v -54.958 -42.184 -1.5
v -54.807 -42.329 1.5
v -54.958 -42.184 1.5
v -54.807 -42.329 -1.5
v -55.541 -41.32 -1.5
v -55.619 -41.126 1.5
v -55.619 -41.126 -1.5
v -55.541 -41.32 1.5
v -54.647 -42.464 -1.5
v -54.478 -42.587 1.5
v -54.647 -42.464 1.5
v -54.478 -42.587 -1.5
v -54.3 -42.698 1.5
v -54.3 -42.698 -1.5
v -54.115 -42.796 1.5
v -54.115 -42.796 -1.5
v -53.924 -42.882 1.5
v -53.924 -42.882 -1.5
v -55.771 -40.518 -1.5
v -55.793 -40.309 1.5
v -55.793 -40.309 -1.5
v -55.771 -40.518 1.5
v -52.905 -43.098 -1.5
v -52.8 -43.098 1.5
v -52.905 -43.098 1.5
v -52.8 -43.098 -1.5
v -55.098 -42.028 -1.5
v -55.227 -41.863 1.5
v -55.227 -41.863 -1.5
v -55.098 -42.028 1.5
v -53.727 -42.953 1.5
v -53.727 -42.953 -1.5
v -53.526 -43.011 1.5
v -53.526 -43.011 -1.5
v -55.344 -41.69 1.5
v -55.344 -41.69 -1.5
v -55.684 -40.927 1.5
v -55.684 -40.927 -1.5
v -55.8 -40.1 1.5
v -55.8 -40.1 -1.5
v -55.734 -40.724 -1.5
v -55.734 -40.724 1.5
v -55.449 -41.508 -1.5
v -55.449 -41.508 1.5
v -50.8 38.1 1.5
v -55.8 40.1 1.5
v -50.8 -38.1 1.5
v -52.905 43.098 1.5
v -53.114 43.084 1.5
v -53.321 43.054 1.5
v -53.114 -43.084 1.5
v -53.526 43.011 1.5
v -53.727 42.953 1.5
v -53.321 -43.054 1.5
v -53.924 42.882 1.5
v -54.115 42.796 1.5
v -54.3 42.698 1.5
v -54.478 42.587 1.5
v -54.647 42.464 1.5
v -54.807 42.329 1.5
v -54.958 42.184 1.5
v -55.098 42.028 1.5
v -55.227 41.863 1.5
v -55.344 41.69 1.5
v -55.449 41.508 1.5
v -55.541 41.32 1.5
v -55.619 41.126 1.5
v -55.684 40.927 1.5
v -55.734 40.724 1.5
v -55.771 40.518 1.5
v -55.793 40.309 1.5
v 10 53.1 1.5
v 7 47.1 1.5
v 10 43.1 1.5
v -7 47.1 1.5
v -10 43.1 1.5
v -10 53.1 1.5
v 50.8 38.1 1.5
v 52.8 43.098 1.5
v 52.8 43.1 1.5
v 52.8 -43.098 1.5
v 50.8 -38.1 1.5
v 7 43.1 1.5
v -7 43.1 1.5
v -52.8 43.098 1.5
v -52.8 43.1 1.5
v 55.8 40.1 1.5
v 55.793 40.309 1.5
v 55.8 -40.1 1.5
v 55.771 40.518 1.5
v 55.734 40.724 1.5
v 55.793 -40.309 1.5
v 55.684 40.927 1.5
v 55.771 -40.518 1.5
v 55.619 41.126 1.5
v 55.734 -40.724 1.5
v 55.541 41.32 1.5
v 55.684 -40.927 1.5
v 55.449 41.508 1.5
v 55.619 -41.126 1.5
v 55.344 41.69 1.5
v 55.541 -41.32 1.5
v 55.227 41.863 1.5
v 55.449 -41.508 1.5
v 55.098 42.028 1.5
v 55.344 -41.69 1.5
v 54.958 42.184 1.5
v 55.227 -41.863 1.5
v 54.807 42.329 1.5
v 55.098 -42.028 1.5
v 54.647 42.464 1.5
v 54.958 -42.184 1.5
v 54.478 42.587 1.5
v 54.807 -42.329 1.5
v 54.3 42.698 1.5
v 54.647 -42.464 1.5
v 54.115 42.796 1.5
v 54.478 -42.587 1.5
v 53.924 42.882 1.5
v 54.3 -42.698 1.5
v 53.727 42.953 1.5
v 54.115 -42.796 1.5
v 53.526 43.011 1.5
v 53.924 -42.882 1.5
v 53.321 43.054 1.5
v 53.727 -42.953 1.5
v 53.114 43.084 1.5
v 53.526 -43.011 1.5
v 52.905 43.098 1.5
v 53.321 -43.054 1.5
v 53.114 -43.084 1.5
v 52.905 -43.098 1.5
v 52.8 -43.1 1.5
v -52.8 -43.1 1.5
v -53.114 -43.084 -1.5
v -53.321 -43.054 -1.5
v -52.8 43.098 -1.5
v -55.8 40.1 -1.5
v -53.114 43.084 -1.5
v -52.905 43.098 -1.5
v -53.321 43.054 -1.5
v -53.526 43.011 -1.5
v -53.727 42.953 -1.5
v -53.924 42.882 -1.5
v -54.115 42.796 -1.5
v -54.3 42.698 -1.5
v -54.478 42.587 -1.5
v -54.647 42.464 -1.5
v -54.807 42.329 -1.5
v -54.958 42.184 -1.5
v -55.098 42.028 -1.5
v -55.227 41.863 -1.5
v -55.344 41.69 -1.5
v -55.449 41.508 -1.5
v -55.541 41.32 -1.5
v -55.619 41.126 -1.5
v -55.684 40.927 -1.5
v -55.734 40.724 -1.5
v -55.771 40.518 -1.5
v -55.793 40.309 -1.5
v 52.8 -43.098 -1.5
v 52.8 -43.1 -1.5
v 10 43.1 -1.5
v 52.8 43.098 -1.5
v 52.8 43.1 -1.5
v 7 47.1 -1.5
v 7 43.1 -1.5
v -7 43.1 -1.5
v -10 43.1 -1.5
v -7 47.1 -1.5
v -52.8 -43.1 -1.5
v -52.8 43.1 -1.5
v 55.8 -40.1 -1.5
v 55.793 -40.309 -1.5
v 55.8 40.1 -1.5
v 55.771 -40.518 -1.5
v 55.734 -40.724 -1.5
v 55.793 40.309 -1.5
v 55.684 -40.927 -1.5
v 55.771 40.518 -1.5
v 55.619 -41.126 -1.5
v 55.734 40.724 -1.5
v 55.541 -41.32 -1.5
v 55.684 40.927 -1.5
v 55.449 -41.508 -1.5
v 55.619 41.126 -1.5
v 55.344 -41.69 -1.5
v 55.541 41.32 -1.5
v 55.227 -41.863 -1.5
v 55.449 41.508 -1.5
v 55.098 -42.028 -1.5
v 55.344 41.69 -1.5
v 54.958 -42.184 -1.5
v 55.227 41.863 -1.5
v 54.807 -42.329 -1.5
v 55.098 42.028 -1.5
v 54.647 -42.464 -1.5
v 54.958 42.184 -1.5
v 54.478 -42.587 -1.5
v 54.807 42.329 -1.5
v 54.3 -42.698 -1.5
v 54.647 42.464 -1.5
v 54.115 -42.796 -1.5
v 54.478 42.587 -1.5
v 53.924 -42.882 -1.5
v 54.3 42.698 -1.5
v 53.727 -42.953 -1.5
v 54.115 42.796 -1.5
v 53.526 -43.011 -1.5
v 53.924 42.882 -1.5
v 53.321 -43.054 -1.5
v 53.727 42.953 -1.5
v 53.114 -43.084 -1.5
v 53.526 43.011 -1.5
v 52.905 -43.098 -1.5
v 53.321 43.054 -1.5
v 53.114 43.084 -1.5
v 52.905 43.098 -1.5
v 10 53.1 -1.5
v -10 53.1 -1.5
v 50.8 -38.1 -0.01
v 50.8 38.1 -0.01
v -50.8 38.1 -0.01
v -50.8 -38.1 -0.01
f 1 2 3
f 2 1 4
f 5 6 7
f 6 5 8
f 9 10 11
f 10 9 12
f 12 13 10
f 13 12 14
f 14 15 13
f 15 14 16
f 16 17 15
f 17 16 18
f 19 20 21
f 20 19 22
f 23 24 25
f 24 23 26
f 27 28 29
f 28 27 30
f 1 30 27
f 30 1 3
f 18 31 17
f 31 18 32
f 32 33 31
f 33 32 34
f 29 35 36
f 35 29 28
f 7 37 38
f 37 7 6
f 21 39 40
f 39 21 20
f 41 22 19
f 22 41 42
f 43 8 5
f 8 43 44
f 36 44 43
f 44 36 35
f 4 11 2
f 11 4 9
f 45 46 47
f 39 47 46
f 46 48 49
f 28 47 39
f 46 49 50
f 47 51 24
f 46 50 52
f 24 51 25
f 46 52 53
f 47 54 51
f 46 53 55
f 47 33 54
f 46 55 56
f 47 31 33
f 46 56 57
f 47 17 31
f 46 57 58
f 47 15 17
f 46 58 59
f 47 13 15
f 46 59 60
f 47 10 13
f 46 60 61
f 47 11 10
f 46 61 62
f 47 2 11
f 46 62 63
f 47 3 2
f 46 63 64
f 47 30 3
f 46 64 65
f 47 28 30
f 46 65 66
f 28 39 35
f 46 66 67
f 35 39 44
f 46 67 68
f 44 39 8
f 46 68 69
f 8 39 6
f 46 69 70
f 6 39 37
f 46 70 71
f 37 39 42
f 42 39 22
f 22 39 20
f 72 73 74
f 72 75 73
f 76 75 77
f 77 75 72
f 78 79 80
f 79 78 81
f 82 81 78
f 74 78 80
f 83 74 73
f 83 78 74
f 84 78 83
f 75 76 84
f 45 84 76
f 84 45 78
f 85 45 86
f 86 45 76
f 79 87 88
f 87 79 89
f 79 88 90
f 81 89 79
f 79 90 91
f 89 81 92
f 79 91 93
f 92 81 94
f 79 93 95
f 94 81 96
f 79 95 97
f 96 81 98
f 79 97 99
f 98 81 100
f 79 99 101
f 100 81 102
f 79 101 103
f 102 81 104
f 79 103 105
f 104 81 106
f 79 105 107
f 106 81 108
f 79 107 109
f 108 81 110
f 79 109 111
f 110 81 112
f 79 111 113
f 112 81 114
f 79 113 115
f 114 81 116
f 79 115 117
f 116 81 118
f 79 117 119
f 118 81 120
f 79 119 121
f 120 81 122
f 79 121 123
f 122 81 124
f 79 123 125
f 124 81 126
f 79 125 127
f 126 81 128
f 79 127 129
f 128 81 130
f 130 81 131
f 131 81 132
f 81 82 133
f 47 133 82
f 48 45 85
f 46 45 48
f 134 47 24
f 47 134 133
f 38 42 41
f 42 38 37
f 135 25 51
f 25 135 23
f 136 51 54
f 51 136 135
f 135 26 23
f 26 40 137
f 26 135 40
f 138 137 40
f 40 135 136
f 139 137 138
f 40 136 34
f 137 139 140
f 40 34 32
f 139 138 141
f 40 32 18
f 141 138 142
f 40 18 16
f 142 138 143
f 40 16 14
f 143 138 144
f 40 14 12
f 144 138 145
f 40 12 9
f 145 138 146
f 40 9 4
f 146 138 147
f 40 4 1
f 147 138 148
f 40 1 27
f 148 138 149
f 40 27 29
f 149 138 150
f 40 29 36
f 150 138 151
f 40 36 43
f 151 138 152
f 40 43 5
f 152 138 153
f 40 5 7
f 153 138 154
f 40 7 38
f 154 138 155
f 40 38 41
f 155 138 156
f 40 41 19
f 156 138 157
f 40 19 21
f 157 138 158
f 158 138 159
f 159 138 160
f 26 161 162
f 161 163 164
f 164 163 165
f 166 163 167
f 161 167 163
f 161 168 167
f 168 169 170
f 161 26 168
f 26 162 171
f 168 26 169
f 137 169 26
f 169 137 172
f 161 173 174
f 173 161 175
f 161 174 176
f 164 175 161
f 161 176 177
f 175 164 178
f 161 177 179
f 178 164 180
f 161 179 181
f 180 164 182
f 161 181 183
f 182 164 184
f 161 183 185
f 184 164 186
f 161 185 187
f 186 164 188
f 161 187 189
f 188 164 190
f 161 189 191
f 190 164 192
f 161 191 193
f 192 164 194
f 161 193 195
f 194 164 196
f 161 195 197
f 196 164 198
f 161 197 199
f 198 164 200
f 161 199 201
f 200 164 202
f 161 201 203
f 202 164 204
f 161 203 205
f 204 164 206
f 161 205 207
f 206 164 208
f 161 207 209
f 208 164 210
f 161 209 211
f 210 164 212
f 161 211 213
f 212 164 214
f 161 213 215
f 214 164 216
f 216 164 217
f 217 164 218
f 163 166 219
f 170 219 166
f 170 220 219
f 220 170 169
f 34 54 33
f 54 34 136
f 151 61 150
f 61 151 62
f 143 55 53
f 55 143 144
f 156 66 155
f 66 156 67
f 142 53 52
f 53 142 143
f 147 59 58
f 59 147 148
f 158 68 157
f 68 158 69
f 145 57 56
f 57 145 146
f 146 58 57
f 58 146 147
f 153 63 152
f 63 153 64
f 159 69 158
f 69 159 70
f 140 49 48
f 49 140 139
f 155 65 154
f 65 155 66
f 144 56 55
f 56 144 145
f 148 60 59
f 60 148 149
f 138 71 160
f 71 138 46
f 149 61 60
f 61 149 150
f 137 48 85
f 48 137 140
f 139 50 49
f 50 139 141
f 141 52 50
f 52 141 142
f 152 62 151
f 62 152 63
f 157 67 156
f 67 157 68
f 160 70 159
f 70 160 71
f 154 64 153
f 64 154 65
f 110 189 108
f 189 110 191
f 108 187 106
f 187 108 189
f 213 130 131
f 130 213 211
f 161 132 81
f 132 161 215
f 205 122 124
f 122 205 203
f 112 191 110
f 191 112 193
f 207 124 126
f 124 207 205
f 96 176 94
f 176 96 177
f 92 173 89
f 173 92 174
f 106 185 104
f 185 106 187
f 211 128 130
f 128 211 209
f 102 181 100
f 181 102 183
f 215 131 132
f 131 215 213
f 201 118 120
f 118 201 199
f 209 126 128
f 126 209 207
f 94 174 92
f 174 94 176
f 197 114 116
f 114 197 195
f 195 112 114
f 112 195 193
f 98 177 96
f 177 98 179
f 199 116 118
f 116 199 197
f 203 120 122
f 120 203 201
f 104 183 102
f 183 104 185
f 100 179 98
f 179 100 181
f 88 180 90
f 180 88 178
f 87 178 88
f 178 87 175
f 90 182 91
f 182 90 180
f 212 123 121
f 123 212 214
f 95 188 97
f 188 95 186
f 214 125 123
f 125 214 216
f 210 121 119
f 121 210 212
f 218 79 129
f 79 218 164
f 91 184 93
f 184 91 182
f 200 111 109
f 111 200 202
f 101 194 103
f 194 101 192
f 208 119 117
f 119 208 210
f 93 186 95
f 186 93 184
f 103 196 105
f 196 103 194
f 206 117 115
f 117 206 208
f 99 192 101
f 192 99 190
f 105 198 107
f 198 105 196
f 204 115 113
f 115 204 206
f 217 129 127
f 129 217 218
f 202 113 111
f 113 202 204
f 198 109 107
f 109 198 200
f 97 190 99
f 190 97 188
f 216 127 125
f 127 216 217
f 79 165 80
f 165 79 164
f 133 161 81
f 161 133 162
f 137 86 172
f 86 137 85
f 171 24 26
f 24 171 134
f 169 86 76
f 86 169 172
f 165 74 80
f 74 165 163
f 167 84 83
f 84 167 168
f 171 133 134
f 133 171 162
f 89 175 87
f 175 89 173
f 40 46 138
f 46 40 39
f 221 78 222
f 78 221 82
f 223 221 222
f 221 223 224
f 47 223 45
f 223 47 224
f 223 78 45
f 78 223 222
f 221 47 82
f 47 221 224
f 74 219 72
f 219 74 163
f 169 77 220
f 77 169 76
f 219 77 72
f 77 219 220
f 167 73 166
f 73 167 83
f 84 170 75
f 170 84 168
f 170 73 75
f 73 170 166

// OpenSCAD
use <MCAD/boxes.scad>

inToMM = 25.4;
tagW = 4 * inToMM;
tagH =  3 * inToMM;
tagD = 3.0;

backD = 1.5;
shoulder = 5.0;
e = 0.01;
$fn=90;

holderX = 20;
holderY = 10;
holderShoulder = 3;

union() {
difference() {
roundedBox([tagW+shoulder*2,tagH+shoulder*2,tagD], 3, true);

translate([-tagW/2,-tagH/2,-e])
cube([tagW,tagH,(tagD-backD)+2*e]);
}

difference() {
translate([-holderX/2,tagH/2+shoulder,-tagD/2])
cube([holderX,holderY,tagD]);

translate([-holderX/2+holderShoulder,tagH/2+shoulder,-tagD/2-e])
cube([holderX-holderShoulder*2,holderY-holderShoulder*2,tagD+e*2]);
}
}
